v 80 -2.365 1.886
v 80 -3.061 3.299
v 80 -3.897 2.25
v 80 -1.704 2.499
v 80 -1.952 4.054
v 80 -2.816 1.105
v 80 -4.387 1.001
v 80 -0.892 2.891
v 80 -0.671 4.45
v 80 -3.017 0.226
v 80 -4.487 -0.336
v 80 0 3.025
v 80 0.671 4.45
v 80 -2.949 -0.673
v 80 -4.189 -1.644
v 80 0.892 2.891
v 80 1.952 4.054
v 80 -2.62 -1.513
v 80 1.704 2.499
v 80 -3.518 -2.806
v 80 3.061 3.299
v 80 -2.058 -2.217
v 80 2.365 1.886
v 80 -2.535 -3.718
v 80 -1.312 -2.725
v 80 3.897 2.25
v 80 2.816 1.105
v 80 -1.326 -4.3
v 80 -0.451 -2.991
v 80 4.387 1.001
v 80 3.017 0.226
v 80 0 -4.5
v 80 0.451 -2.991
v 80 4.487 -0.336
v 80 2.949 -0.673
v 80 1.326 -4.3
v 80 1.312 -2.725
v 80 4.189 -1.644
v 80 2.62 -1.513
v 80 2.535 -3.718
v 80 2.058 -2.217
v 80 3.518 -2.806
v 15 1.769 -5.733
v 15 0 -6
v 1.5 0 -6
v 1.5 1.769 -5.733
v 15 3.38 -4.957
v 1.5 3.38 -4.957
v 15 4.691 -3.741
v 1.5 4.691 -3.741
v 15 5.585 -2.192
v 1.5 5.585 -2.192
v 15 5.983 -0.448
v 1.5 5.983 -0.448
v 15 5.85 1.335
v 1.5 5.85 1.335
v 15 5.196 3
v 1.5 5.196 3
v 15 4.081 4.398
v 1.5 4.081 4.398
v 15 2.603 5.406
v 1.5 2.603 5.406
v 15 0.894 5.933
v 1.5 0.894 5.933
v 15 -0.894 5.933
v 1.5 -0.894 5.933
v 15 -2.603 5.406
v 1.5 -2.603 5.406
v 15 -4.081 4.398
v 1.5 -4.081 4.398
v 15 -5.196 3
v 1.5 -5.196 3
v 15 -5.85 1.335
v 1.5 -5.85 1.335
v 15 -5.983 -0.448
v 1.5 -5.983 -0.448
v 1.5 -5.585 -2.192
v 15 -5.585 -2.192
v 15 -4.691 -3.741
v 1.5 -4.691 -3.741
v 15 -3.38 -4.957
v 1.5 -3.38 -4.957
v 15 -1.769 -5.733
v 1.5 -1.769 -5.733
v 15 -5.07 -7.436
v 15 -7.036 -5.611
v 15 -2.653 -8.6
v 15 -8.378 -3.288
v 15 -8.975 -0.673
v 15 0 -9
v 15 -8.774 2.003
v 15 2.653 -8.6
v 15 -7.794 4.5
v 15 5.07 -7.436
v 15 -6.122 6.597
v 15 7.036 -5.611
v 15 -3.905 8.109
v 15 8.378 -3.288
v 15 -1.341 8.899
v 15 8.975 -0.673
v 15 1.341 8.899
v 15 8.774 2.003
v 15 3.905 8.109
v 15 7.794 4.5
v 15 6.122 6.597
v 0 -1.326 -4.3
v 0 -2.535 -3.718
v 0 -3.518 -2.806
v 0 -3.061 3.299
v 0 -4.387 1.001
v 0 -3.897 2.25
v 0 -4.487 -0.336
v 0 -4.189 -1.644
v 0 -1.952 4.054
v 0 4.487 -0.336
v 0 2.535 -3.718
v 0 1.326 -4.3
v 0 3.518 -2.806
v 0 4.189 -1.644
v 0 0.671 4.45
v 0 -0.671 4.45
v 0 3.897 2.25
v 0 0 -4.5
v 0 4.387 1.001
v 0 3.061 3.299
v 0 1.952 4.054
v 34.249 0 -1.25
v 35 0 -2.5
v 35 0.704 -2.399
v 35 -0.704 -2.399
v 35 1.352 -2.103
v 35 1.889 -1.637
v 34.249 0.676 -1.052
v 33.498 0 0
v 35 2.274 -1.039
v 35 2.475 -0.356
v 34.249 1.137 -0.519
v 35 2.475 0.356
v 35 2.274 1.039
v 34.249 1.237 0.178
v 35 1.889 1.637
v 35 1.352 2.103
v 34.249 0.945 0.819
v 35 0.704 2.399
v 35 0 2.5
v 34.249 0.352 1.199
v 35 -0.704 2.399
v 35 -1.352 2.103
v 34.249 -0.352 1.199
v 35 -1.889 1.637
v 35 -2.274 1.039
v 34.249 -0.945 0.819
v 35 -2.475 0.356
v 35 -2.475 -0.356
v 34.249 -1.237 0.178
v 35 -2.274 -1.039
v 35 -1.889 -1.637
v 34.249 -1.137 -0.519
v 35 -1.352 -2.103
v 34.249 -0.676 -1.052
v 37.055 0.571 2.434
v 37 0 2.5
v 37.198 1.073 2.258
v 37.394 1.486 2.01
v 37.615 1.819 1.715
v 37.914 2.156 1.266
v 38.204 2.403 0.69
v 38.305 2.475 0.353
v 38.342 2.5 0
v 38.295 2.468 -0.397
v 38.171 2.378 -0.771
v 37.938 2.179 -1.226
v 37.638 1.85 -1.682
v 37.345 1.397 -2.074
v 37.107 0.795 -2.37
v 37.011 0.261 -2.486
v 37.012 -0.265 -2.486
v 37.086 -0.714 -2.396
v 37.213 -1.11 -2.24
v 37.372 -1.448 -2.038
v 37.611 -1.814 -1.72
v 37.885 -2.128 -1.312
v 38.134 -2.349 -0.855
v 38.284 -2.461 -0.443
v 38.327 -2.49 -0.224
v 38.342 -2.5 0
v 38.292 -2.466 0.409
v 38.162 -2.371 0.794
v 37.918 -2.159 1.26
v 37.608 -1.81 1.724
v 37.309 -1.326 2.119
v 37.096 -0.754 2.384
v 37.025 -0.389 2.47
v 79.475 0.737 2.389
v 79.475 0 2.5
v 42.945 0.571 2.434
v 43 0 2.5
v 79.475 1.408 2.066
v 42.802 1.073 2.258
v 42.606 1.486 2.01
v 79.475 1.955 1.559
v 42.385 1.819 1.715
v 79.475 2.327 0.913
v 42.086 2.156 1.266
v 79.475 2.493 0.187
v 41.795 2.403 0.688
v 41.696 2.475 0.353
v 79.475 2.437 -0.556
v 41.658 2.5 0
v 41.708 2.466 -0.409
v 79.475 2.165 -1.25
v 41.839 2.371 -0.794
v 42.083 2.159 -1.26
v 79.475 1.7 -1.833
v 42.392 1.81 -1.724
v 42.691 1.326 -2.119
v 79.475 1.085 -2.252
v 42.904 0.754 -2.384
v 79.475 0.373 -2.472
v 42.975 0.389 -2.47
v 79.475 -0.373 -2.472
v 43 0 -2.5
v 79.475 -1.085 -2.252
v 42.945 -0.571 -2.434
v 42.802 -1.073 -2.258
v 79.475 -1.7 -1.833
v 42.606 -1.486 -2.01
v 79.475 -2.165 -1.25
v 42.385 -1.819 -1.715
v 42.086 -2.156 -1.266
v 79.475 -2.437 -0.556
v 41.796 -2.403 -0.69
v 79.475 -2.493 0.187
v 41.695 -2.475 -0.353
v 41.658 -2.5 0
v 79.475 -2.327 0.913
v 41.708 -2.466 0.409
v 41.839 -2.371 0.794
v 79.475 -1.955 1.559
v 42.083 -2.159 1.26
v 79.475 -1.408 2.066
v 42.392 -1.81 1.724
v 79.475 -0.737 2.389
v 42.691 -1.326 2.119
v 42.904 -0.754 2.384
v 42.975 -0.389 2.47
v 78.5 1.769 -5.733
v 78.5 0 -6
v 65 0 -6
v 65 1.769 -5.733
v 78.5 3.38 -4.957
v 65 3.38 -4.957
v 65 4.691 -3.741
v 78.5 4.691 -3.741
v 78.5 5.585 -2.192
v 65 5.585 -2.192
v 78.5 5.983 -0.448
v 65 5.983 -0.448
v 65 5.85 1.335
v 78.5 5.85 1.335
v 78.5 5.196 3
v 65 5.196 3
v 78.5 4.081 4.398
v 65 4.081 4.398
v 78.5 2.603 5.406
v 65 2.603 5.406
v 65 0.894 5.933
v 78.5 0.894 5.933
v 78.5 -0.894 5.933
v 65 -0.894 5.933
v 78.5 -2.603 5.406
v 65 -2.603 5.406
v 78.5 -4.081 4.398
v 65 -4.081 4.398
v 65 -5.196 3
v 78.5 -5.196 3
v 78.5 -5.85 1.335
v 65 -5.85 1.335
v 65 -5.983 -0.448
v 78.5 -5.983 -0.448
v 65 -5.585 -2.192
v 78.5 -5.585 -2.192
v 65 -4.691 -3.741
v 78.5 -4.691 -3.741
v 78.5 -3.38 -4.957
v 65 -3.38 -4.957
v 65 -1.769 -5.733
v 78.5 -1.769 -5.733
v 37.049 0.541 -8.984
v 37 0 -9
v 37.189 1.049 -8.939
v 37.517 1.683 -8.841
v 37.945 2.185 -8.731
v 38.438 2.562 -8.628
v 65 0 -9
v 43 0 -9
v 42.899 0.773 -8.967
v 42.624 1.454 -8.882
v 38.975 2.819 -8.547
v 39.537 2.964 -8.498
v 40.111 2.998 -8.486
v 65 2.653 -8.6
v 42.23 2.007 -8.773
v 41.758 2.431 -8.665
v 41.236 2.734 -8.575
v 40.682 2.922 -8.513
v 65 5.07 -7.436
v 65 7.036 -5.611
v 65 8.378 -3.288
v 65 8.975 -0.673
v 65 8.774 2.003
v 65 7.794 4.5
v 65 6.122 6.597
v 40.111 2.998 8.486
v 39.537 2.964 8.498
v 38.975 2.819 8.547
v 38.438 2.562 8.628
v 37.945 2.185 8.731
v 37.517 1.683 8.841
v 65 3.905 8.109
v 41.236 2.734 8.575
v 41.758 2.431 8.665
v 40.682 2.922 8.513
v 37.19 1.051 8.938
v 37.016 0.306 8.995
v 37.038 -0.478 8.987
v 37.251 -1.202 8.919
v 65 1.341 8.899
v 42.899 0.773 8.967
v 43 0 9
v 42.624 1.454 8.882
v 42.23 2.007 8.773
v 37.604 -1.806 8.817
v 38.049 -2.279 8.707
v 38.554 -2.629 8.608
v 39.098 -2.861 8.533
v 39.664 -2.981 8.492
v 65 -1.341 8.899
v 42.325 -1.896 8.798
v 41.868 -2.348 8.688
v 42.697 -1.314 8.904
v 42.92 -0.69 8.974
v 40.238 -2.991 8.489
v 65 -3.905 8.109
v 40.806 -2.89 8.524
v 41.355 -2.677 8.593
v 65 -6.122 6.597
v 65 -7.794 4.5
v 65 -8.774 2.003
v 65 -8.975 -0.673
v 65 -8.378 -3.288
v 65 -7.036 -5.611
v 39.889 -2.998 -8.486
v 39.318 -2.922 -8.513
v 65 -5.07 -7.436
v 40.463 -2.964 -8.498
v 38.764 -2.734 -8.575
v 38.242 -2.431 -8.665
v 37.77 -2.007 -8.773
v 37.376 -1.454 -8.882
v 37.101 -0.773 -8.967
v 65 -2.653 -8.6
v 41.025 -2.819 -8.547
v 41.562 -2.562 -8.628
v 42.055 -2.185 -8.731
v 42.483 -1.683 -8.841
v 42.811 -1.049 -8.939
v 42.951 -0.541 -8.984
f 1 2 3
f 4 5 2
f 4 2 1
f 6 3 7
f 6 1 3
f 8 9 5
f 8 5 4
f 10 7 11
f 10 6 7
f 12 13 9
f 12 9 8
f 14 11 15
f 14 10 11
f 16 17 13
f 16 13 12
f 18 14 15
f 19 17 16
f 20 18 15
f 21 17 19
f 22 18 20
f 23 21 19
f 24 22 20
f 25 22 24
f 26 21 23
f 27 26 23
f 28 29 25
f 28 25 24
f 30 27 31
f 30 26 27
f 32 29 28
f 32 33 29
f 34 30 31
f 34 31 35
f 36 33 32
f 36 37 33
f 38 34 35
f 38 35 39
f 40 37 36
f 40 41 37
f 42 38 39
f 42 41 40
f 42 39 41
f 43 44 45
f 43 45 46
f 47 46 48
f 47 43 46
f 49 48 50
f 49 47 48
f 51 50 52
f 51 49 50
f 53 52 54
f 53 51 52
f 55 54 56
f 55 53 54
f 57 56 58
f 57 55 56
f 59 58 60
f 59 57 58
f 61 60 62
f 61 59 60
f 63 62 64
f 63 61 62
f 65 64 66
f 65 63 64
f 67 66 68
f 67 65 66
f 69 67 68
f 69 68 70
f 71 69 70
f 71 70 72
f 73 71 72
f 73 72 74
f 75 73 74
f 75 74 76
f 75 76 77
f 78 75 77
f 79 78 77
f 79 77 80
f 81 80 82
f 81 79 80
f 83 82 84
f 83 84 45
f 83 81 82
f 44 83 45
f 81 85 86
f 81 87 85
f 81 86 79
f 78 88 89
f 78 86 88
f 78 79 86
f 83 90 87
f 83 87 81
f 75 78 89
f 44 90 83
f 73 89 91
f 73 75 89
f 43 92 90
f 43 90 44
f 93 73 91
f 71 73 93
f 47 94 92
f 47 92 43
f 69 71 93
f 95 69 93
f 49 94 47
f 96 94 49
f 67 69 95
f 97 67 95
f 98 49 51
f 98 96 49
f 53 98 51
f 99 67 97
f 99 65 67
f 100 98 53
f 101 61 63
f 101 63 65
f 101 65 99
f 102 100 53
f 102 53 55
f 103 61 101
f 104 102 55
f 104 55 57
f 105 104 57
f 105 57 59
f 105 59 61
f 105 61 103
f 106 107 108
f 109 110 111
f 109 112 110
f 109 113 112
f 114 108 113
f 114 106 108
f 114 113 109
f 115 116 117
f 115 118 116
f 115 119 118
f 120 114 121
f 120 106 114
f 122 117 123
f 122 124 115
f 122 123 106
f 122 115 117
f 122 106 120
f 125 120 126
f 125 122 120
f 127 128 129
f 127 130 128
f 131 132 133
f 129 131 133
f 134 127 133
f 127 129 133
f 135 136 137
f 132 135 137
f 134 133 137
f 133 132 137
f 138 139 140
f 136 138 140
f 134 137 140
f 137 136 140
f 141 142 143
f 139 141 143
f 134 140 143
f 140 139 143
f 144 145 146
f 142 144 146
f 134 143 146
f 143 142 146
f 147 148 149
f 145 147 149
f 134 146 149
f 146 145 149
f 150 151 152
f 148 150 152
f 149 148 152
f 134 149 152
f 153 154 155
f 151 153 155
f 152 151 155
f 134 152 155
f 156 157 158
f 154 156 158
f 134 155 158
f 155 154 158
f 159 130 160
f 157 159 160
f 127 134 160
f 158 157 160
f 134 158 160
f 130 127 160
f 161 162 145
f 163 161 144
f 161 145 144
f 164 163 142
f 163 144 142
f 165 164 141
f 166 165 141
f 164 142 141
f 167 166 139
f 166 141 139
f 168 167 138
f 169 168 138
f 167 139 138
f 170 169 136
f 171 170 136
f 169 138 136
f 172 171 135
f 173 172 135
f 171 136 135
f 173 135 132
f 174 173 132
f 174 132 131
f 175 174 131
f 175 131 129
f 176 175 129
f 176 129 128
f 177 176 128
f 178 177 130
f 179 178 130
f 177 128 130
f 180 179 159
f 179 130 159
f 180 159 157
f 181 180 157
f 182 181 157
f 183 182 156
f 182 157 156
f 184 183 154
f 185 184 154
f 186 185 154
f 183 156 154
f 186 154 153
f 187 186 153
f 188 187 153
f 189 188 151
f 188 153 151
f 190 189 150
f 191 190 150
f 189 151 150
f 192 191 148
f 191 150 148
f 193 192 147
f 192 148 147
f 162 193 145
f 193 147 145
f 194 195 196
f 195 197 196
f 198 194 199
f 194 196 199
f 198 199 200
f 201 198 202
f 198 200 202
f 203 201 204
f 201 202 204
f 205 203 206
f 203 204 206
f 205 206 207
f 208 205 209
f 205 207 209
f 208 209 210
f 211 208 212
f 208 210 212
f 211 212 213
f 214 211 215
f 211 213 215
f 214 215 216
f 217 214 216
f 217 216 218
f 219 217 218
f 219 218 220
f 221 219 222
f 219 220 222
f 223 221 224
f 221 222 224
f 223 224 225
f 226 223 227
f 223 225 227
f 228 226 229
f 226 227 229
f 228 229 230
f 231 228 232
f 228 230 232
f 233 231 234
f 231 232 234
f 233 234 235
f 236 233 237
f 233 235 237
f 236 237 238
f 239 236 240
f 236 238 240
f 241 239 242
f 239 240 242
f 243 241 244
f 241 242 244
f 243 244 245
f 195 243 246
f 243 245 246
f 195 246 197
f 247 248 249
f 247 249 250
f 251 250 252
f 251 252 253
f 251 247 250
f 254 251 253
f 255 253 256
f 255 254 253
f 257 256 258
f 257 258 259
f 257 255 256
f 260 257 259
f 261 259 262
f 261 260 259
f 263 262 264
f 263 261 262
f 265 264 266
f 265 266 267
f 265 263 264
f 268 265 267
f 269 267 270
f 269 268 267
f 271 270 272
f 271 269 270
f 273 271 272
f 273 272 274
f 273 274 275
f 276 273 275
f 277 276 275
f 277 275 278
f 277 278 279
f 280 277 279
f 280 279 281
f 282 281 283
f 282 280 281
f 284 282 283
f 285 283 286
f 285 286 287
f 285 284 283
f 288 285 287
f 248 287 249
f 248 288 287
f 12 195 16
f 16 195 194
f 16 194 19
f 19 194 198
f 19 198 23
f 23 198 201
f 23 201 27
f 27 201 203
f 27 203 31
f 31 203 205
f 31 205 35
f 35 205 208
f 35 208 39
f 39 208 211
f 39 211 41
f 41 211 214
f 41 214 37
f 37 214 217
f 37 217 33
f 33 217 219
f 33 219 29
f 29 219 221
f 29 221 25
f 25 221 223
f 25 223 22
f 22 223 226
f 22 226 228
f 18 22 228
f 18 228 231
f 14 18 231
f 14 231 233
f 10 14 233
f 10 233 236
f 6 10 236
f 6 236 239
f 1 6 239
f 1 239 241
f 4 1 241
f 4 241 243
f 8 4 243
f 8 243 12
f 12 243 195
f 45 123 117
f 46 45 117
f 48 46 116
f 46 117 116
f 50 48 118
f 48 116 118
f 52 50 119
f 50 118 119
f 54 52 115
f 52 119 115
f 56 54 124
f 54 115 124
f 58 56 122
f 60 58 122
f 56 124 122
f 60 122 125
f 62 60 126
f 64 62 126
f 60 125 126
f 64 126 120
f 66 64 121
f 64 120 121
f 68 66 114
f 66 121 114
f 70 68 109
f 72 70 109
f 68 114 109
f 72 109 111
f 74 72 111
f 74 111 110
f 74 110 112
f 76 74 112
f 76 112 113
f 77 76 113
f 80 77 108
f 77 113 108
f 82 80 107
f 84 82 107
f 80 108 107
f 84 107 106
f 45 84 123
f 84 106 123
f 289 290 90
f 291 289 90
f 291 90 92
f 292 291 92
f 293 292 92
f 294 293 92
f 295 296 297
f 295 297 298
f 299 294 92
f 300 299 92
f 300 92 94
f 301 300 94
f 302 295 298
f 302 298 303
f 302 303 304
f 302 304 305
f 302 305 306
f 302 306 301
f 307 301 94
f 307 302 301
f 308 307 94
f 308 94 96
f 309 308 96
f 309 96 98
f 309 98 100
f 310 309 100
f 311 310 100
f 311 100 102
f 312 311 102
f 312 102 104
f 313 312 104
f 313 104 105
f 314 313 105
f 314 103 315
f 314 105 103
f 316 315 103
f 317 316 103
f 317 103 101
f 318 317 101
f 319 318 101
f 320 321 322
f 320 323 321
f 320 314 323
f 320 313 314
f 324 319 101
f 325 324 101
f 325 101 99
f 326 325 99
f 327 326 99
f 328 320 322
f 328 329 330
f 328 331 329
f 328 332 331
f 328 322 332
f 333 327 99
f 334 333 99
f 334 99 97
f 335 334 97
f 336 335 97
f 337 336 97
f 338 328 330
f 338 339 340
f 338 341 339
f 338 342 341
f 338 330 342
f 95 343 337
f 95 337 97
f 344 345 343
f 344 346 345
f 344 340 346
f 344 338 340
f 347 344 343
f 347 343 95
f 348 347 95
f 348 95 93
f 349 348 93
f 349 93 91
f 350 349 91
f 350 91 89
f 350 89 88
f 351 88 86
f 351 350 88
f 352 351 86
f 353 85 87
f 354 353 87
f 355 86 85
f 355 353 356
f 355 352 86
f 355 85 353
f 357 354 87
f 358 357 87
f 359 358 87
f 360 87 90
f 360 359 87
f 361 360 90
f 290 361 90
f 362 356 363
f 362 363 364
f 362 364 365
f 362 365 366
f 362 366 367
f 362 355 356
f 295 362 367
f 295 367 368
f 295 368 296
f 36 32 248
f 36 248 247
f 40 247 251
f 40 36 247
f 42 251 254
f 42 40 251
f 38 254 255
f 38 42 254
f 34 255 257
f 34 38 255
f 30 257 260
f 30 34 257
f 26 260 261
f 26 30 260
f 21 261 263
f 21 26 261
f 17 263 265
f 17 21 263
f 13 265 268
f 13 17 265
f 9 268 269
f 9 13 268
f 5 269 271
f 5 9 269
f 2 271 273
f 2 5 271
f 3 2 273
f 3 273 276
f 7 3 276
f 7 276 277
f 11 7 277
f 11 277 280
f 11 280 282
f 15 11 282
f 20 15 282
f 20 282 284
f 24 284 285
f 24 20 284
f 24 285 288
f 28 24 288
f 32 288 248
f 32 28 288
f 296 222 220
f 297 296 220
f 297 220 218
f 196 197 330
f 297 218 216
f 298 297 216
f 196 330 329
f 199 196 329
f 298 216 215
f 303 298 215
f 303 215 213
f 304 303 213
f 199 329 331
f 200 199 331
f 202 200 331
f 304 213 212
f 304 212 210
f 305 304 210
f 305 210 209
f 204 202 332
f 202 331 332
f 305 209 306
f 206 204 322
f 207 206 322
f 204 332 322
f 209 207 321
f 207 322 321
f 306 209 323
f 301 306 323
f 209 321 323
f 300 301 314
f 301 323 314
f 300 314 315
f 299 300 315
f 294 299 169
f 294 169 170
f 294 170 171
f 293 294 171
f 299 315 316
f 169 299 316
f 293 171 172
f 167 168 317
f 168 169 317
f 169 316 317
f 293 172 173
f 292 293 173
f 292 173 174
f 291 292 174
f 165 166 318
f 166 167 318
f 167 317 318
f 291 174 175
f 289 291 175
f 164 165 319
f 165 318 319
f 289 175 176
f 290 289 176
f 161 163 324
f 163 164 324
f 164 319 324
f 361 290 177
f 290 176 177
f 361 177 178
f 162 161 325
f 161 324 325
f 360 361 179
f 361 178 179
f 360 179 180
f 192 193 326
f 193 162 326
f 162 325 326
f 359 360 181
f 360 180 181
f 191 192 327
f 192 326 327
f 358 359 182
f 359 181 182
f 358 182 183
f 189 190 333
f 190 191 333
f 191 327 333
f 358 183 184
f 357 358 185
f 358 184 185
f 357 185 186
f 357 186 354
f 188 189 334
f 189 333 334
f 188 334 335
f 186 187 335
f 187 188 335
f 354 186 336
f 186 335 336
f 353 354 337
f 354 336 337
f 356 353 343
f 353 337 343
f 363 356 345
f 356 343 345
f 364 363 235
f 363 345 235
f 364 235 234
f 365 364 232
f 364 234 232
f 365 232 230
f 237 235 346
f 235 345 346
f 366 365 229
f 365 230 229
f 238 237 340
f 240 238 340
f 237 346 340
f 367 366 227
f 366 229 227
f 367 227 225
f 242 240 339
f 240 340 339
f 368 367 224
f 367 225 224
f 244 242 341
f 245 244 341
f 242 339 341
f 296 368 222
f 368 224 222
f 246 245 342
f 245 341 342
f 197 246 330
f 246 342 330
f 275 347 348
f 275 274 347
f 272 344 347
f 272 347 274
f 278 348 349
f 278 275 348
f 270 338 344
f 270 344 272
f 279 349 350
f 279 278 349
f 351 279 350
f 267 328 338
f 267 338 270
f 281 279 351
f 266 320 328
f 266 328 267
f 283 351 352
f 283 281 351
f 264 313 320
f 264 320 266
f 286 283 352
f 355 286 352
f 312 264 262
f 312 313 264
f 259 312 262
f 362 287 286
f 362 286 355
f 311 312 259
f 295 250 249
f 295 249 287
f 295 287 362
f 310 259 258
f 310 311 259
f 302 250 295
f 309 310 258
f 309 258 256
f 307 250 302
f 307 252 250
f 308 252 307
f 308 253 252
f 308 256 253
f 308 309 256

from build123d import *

# Parameters (mm, degrees)
M6X1_0_TAPPED_HOLE1_D           = 5
M6X1_0_TAPPED_HOLE1_DEPTH       = 45
M6X1_0_TAPPED_HOLE1_CSINK_D     = 6.05
M6X1_0_TAPPED_HOLE1_CSINK_ANGLE = 90
M6X1_0_TAPPED_HOLE1_TIP         = 1.502151548
SKETCH5_R                       = 3
CUT_EXTRUDE1_DEPTH              = 10
CUT_EXTRUDE1_DEPTH_BACK         = 10
CHAMFER1_SIZE                   = 1.5


with BuildPart() as part:
    # Sketch1 → Revolve4 (revolve)
    with BuildSketch(Plane(origin=(0, 0, 0), x_dir=(1, 0, 0), z_dir=(0, 1, 0))):
        Polygon((0, 6), (15, 6), (15, 9), (65, 9), (65, 6), (80, 6), (80, 0), (0, 0), align=None)
    revolve(axis=Axis((0, 0, 0), (1, 0, 0)))

    # M6x1.0 Tapped Hole1
    with Locations(Plane(origin=(80, 0, 0), x_dir=(0, 0, -1), z_dir=(1, 0, 0))):
        with Locations((0, 0)):
            CounterSinkHole(M6X1_0_TAPPED_HOLE1_D / 2, M6X1_0_TAPPED_HOLE1_CSINK_D / 2, depth=M6X1_0_TAPPED_HOLE1_DEPTH, counter_sink_angle=M6X1_0_TAPPED_HOLE1_CSINK_ANGLE)
            with Locations((0, 0, -(M6X1_0_TAPPED_HOLE1_DEPTH + M6X1_0_TAPPED_HOLE1_TIP / 2))):  # 118° drill point
                Cone(0, M6X1_0_TAPPED_HOLE1_D / 2, M6X1_0_TAPPED_HOLE1_TIP, mode=Mode.SUBTRACT)

    # Sketch5 → Cut-Extrude1 (cut, two sides)
    with BuildSketch(Plane.XY) as cut_extrude1_sk:
        with Locations((40, 0)):
            Circle(SKETCH5_R)
    extrude(amount=CUT_EXTRUDE1_DEPTH, mode=Mode.SUBTRACT)
    extrude(cut_extrude1_sk.sketch, amount=-CUT_EXTRUDE1_DEPTH_BACK, mode=Mode.SUBTRACT)

    # Chamfer1
    chamfer1_edges = [part.edges().sort_by_distance(p)[0] for p in [
        (0, 0, 6),
        (80, 0, 6),
    ]]
    chamfer(chamfer1_edges, length=CHAMFER1_SIZE)


solid = part.part
